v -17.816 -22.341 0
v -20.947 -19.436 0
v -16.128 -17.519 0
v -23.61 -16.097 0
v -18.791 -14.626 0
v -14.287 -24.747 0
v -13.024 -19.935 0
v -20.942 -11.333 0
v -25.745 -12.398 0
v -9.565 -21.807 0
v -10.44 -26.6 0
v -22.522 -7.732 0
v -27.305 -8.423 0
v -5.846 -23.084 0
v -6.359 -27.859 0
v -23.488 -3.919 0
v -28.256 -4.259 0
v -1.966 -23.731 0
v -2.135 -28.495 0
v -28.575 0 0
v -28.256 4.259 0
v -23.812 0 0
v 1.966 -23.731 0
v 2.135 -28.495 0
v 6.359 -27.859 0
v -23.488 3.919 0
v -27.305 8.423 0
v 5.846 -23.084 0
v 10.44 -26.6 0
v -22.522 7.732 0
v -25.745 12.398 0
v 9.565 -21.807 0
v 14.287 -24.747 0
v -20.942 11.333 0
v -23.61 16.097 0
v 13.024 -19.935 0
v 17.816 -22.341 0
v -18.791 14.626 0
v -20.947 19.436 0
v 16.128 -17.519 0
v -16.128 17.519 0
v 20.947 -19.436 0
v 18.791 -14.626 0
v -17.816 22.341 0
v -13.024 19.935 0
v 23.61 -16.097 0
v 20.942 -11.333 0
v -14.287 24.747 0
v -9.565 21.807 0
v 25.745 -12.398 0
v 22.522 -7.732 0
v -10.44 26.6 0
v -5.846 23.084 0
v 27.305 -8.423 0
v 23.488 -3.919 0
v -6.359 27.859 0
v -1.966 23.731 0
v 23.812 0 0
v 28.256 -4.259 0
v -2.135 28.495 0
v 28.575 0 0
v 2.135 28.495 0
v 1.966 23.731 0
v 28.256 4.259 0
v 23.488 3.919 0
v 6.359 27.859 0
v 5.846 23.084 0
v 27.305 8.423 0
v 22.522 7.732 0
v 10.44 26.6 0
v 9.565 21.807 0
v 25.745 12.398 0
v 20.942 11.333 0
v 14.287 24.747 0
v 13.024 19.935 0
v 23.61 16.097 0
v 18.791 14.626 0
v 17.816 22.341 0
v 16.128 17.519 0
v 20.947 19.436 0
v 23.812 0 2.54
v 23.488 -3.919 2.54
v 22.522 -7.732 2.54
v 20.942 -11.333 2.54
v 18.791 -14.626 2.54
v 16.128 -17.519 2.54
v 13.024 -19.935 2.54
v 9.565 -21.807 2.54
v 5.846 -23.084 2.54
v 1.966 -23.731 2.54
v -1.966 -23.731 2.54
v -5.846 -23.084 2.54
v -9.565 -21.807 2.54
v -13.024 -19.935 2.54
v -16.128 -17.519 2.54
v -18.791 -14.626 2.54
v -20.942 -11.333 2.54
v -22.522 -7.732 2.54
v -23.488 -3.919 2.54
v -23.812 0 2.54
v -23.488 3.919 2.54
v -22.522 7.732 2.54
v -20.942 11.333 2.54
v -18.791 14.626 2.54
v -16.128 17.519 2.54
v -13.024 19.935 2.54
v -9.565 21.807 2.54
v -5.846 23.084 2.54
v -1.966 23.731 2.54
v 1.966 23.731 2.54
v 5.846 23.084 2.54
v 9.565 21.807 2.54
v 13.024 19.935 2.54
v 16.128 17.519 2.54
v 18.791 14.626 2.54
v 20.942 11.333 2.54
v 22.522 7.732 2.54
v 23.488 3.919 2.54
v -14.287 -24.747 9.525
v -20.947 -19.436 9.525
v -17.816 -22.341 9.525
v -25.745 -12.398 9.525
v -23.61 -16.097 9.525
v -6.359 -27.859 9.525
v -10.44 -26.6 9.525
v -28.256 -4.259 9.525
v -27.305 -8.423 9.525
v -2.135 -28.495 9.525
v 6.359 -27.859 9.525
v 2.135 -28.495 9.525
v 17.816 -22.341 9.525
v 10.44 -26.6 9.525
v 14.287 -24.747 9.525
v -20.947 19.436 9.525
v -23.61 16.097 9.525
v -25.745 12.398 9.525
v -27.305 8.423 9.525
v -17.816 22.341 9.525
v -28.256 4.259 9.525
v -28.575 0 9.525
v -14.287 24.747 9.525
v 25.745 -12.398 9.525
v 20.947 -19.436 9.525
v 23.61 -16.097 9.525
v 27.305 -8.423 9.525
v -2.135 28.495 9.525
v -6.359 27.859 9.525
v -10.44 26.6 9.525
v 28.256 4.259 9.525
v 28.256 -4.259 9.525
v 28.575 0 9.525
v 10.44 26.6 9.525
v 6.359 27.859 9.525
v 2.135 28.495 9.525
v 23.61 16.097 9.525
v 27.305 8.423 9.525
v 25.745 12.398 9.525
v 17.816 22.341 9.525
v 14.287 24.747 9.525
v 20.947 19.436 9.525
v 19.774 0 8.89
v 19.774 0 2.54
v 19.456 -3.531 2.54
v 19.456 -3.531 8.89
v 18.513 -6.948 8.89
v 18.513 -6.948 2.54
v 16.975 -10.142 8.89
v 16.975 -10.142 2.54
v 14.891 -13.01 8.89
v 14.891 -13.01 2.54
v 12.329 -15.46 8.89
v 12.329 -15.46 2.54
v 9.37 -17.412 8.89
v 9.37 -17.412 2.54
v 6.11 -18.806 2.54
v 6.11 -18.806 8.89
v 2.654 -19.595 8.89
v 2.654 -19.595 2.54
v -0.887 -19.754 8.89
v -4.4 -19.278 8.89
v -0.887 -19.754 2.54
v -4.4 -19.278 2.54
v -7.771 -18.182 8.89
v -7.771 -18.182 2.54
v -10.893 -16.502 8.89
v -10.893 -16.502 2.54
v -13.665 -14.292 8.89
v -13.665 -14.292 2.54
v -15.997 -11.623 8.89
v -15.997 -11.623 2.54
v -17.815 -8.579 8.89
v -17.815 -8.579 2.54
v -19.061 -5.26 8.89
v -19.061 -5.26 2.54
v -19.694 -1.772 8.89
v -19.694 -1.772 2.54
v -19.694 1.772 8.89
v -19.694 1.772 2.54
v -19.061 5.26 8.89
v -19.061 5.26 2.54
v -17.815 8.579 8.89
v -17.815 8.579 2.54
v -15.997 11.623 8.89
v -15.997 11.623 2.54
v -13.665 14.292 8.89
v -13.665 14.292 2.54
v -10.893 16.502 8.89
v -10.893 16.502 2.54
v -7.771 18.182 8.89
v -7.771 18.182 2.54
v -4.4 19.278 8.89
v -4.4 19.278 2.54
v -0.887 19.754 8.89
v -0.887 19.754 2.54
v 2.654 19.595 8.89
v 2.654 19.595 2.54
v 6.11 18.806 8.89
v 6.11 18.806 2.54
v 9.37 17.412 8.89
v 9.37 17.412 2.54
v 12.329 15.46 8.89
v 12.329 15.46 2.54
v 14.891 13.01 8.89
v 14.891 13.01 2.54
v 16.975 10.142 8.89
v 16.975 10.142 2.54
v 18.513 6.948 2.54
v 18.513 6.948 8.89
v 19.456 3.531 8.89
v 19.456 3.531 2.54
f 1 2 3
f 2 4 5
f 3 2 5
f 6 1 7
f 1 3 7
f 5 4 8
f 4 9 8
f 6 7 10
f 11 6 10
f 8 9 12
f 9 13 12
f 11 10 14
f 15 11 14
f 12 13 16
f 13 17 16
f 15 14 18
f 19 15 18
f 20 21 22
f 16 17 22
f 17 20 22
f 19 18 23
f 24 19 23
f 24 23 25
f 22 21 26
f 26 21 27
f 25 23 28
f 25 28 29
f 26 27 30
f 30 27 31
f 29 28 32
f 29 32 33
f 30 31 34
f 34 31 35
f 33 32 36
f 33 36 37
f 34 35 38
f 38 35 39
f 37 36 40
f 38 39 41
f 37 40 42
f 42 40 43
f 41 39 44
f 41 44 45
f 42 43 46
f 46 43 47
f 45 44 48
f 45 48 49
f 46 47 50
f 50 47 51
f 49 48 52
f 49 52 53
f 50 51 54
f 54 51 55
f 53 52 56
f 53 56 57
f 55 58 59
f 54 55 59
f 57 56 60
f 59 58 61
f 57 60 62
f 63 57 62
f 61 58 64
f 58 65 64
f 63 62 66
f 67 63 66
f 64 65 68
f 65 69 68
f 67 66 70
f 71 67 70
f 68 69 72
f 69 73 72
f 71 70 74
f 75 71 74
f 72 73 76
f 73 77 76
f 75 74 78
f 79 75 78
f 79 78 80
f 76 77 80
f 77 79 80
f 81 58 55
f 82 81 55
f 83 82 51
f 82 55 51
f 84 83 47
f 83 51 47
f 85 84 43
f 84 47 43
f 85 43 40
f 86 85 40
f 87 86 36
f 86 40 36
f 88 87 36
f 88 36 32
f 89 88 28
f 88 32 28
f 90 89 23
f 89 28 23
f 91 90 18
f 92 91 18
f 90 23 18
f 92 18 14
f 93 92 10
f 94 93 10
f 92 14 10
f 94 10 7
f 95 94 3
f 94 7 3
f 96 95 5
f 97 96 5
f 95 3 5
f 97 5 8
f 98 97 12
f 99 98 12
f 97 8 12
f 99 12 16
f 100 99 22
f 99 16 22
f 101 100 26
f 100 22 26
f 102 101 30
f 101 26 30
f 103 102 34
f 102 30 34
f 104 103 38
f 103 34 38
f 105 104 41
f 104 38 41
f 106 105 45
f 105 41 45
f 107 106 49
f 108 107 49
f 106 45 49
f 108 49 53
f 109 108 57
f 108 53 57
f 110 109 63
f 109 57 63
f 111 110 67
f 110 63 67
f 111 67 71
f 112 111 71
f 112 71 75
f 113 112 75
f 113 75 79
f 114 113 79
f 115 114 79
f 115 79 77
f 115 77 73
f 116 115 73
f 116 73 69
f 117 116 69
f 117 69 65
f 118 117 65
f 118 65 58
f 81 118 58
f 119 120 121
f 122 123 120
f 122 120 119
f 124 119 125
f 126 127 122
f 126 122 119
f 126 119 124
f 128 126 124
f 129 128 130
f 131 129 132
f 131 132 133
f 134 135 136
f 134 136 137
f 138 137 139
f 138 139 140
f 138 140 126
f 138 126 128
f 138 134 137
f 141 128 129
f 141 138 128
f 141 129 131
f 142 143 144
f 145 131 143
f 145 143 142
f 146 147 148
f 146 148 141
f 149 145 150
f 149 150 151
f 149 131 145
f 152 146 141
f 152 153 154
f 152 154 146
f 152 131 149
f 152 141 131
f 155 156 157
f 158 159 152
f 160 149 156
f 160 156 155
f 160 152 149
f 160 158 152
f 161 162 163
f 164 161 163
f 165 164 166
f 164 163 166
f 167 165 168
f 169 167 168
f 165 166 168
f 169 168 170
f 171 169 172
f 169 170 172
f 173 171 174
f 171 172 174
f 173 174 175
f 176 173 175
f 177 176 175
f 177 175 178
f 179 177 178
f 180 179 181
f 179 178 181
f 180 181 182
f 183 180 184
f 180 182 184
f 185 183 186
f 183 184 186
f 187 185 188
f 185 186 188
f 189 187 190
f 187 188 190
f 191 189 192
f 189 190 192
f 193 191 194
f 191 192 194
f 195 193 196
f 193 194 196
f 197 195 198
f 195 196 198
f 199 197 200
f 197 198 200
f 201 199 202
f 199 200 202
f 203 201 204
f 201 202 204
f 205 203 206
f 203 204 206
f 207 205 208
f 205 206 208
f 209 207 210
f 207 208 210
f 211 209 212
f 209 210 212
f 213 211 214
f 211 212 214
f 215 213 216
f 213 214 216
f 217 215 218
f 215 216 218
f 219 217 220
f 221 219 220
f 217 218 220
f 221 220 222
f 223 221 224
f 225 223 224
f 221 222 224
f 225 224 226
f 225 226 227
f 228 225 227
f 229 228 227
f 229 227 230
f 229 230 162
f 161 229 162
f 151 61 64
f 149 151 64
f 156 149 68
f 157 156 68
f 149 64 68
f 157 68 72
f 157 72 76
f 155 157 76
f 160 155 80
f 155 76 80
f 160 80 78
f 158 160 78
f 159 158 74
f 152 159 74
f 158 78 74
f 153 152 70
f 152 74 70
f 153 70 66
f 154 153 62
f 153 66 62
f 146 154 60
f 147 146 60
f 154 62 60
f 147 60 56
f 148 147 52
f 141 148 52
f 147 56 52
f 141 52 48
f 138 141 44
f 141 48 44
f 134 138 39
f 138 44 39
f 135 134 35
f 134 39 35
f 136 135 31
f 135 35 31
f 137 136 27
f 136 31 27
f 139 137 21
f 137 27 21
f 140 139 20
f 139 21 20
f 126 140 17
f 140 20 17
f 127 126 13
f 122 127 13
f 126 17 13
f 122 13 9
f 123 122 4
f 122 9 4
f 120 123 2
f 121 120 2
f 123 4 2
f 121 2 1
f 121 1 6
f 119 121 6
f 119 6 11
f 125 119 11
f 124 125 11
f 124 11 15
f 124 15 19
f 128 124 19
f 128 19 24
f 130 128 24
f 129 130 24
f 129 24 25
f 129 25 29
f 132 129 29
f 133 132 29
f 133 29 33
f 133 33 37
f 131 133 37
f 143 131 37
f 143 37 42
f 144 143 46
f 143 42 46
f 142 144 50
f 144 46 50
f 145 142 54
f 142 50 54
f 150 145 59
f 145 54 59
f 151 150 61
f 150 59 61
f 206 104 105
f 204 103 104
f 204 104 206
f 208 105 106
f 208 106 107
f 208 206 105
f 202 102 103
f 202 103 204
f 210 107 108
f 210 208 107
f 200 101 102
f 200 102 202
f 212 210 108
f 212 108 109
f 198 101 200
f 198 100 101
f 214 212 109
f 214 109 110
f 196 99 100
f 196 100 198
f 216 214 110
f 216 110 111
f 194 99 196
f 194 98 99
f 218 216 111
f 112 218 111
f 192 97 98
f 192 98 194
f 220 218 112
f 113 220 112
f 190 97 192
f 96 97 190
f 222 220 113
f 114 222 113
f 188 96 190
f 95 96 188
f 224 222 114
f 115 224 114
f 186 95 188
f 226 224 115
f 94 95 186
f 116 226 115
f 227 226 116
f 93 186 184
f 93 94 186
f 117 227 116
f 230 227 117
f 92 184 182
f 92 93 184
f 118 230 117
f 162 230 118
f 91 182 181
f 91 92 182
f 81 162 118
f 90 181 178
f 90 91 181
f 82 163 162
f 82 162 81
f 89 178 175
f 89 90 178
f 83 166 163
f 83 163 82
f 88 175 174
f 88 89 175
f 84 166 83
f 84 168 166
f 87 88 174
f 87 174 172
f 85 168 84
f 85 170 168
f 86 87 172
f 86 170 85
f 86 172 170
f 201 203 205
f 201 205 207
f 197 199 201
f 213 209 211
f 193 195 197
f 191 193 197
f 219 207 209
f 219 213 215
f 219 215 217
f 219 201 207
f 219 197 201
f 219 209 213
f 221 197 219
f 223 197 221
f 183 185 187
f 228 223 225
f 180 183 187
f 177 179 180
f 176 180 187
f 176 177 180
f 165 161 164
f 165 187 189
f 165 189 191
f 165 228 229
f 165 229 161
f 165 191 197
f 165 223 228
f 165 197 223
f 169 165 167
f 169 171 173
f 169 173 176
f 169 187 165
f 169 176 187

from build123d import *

# Parameters (mm, degrees)
F0_R     = 28.575
F1_DEPTH = 9.525
F2_R     = 23.8125
F3_DEPTH = 2.54
F4_R     = 19.773545
F5_DEPTH = 6.35


with BuildPart() as f1:
    # F0 (on Top) → F1 (new body)
    with BuildSketch(Plane.XY):
        Circle(F0_R)
    extrude(amount=F1_DEPTH)

    # F2 (on face) → F3 (cut)
    with BuildSketch(Plane(origin=(0, 0, 0), x_dir=(1, 0, 0), z_dir=(0, 0, -1))):
        Circle(F2_R)
    extrude(amount=-F3_DEPTH, mode=Mode.SUBTRACT)

    # F4 (on face) → F5 (cut)
    with BuildSketch(Plane(origin=(0, 0, 2.54), x_dir=(1, 0, 0), z_dir=(0, 0, -1))):
        Circle(F4_R)
    extrude(amount=-F5_DEPTH, mode=Mode.SUBTRACT)


solid = f1.part
